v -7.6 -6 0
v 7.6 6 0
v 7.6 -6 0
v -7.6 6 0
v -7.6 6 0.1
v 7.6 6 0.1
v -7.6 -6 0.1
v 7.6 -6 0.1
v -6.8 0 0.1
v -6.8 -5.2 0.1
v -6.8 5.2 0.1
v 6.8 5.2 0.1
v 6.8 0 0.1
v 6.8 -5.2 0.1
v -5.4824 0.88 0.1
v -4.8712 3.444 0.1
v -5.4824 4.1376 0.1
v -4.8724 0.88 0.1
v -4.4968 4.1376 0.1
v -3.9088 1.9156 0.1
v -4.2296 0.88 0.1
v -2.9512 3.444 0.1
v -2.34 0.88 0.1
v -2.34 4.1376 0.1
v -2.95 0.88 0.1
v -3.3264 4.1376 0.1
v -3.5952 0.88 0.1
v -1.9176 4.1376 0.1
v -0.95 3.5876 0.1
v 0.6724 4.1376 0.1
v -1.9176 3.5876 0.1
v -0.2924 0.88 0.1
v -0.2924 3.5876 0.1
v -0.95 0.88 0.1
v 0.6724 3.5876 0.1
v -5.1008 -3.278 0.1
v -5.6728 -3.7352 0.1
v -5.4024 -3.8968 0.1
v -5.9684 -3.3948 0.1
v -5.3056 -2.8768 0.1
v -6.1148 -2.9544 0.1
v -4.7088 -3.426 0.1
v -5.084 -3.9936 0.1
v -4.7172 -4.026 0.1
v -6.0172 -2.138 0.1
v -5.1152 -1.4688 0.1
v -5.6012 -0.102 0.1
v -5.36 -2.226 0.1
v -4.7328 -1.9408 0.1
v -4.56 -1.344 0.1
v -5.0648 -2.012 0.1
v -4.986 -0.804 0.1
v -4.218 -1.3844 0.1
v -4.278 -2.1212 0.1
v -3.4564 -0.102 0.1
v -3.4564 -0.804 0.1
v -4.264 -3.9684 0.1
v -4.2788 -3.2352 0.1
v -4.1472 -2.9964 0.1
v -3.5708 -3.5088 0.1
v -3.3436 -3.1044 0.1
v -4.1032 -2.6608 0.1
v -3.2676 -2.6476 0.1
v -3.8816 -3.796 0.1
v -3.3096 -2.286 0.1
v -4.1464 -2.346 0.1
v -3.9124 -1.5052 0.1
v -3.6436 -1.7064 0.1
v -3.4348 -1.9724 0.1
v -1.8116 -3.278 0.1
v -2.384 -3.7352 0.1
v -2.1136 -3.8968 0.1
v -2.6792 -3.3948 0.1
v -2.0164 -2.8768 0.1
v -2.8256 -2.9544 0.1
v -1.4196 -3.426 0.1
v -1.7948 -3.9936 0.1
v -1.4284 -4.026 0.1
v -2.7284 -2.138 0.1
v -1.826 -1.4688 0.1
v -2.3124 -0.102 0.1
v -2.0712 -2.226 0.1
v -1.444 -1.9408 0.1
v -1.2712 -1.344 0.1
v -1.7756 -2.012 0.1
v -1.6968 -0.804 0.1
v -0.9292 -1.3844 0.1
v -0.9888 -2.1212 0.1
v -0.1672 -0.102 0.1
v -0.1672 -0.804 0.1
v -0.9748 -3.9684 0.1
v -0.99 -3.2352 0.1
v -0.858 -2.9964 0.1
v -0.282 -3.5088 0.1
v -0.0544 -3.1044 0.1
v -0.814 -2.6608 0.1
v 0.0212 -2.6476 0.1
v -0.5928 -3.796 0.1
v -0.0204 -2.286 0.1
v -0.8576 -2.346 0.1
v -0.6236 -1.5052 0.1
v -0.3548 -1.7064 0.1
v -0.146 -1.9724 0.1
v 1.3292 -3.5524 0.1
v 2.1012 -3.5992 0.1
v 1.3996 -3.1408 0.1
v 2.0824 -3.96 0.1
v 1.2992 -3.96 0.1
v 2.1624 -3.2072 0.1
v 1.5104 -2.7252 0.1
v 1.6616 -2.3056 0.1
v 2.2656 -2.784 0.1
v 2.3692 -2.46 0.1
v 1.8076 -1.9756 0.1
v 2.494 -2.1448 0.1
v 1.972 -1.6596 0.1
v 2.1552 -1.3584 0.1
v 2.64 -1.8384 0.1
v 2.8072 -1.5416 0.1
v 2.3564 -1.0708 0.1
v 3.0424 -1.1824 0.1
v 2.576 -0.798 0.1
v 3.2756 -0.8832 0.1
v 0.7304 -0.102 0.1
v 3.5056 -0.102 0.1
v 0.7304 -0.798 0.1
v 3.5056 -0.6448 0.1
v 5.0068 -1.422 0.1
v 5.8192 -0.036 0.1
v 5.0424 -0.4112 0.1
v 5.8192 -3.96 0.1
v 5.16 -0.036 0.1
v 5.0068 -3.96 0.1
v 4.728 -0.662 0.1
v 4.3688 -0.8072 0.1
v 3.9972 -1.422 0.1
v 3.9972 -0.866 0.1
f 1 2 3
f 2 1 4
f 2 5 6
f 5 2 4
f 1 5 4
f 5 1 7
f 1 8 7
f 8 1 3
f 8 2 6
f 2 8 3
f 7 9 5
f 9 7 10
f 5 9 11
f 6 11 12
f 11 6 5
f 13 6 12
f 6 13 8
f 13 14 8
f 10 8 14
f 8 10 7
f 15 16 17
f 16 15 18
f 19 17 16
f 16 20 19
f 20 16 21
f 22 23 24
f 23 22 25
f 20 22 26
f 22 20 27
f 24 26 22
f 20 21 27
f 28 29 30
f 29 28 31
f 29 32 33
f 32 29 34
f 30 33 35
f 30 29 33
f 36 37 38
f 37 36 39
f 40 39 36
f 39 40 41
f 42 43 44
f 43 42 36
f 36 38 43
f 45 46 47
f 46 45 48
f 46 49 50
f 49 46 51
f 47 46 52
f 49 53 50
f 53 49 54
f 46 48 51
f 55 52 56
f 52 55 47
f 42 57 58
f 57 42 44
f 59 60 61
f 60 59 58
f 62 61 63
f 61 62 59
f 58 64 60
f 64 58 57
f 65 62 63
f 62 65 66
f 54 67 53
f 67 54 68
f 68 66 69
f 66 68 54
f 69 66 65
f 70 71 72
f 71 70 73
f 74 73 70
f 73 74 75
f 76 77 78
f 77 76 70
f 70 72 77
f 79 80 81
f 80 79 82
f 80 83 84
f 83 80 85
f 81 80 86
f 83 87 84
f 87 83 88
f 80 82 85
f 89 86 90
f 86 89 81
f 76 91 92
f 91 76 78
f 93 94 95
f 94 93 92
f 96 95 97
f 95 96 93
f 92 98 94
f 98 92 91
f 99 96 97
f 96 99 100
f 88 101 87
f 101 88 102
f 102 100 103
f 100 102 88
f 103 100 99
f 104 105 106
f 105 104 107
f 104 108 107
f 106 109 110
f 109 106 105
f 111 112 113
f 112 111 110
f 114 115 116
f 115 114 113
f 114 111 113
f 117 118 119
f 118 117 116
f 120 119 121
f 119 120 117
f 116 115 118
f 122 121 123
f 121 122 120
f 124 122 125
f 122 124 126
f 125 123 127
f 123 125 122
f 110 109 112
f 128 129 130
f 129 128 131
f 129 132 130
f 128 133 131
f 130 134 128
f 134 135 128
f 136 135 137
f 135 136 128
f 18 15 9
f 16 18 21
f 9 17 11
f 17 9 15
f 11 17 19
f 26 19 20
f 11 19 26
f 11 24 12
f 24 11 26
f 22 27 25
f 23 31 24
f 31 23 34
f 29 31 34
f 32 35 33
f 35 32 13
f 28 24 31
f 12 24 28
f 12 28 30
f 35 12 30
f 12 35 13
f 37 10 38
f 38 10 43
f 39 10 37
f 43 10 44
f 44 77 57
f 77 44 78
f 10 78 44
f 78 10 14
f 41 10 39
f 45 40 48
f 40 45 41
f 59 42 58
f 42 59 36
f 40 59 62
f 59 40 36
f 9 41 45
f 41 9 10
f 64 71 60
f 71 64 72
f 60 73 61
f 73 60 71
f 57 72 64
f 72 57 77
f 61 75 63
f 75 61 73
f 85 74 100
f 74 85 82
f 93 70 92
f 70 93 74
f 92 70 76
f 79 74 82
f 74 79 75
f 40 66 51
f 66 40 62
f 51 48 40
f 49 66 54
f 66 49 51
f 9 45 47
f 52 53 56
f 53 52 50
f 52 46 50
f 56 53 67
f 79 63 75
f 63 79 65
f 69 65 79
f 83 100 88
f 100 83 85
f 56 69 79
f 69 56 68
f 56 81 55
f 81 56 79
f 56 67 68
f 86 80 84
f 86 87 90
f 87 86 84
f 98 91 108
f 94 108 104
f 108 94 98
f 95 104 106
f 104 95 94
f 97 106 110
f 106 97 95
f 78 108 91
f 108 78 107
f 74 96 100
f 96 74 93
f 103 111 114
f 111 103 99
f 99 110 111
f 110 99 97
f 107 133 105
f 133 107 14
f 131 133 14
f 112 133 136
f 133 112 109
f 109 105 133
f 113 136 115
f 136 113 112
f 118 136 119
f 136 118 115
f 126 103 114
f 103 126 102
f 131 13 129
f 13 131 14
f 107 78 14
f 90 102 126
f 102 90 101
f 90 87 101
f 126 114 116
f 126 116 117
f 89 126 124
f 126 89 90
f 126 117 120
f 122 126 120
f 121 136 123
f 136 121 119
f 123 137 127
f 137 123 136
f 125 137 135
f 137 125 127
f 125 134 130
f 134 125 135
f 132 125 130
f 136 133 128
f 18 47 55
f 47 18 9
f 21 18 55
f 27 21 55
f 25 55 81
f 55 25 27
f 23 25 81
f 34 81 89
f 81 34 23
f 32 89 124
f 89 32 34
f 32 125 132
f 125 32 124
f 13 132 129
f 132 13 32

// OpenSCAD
// file: ../p/box5-12.scad
use <../lib.scad>
function ldraw_lib__box5_12() = [
// 0 Box with 5 Faces without Any Edges
// 0 Name: box5-12.dat
// 0 Author: Chris Dee [cwdee]
// 0 !LDRAW_ORG Primitive UPDATE 2009-02
// 0 !LICENSE Licensed under CC BY 2.0 and CC BY 4.0 : see CAreadme.txt
// 
// 0 BFC CERTIFY CCW
  [0,"BFC","CERTIFY"],
  [0,"BFC","CCW"],
// 
// 0 !HISTORY 2009-09-03 [PTadmin] Official Update 2009-02
// 
// 
// 4 16 1 1 1 1 1 -1 -1 1 -1 -1 1 1
  [4,16,1,1,1,1,1,-1,-1,1,-1,-1,1,1],
// 4 16 -1 0 1 1 0 1 1 1 1 -1 1 1
  [4,16,-1,0,1,1,0,1,1,1,1,-1,1,1],
// 4 16 -1 0 -1 -1 0 1 -1 1 1 -1 1 -1
  [4,16,-1,0,-1,-1,0,1,-1,1,1,-1,1,-1],
// 4 16 1 0 -1 -1 0 -1 -1 1 -1 1 1 -1
  [4,16,1,0,-1,-1,0,-1,-1,1,-1,1,1,-1],
// 4 16 1 0 1 1 0 -1 1 1 -1 1 1 1
  [4,16,1,0,1,1,0,-1,1,1,-1,1,1,1],
// 0
];
makepoly(ldraw_lib__box5_12(), line=0.2);
// main file
use <../lib.scad>
use <../p/box5-12.scad>
function ldraw_lib__4100418d() = [
// 0 Sticker  1.5 x  1.9 with "MT 5571"
// 0 Name: 4100418d.dat
// 0 Author: J.C. Tchang [tchang]
// 0 !LDRAW_ORG Part UPDATE 2013-01
// 0 !LICENSE Licensed under CC BY 2.0 and CC BY 4.0 : see CAreadme.txt
// 
// 0 BFC CERTIFY CCW
  [0,"BFC","CERTIFY"],
  [0,"BFC","CCW"],
// 
// 0 !KEYWORDS Set 5571
// 
// 0 !HISTORY 2013-07-21 [PTadmin] Official Update 2013-01
// 
// 
// 1 16 0 -0.25 0 19 0 0 0 0.25 0 0 0 15 box5-12.dat
  [1,16,0,-0.25,0,19,0,0,0,0.25,0,0,0,15, ldraw_lib__box5_12()],
// 4 0 -19 -0.25 15 -19 -0.25 -15 -17 -0.25 -13 -17 -0.25 0
  [4,0,-19,-0.25,15,-19,-0.25,-15,-17,-0.25,-13,-17,-0.25,0],
// 3 0 -19 -0.25 15 -17 -0.25 0 -17 -0.25 13
  [3,0,-19,-0.25,15,-17,-0.25,0,-17,-0.25,13],
// 4 0 -19 -0.25 15 -17 -0.25 13 17 -0.25 13 19 -0.25 15
  [4,0,-19,-0.25,15,-17,-0.25,13,17,-0.25,13,19,-0.25,15],
// 4 0 19 -0.25 15 17 -0.25 13 17 -0.25 0 19 -0.25 -15
  [4,0,19,-0.25,15,17,-0.25,13,17,-0.25,0,19,-0.25,-15],
// 3 0 17 -0.25 0 17 -0.25 -13 19 -0.25 -15
  [3,0,17,-0.25,0,17,-0.25,-13,19,-0.25,-15],
// 4 0 -19 -0.25 -15 19 -0.25 -15 17 -0.25 -13 -17 -0.25 -13
  [4,0,-19,-0.25,-15,19,-0.25,-15,17,-0.25,-13,-17,-0.25,-13],
// 0 //
// 4 0 -13.706 -0.25 2.2 -12.181 -0.25 2.2 -12.178 -0.25 8.61 -13.706 -0.25 10.344
  [4,0,-13.706,-0.25,2.2,-12.181,-0.25,2.2,-12.178,-0.25,8.61,-13.706,-0.25,10.344],
// 3 0 -11.242 -0.25 10.344 -13.706 -0.25 10.344 -12.178 -0.25 8.61
  [3,0,-11.242,-0.25,10.344,-13.706,-0.25,10.344,-12.178,-0.25,8.61],
// 4 0 -9.772 -0.25 4.789 -11.242 -0.25 10.344 -12.178 -0.25 8.61 -10.574 -0.25 2.2
  [4,0,-9.772,-0.25,4.789,-11.242,-0.25,10.344,-12.178,-0.25,8.61,-10.574,-0.25,2.2],
// 4 0 -7.378 -0.25 8.61 -7.375 -0.25 2.2 -5.85 -0.25 2.2 -5.85 -0.25 10.344
  [4,0,-7.378,-0.25,8.61,-7.375,-0.25,2.2,-5.85,-0.25,2.2,-5.85,-0.25,10.344],
// 4 0 -7.378 -0.25 8.61 -8.316 -0.25 10.344 -9.772 -0.25 4.789 -8.988 -0.25 2.2
  [4,0,-7.378,-0.25,8.61,-8.316,-0.25,10.344,-9.772,-0.25,4.789,-8.988,-0.25,2.2],
// 3 0 -5.85 -0.25 10.344 -8.316 -0.25 10.344 -7.378 -0.25 8.61
  [3,0,-5.85,-0.25,10.344,-8.316,-0.25,10.344,-7.378,-0.25,8.61],
// 3 0 -9.772 -0.25 4.789 -10.574 -0.25 2.2 -8.988 -0.25 2.2
  [3,0,-9.772,-0.25,4.789,-10.574,-0.25,2.2,-8.988,-0.25,2.2],
// 4 0 -2.375 -0.25 8.969 1.681 -0.25 10.344 -4.794 -0.25 10.344 -4.794 -0.25 8.969
  [4,0,-2.375,-0.25,8.969,1.681,-0.25,10.344,-4.794,-0.25,10.344,-4.794,-0.25,8.969],
// 4 0 -2.375 -0.25 8.969 -2.375 -0.25 2.2 -0.731 -0.25 2.2 -0.731 -0.25 8.969
  [4,0,-2.375,-0.25,8.969,-2.375,-0.25,2.2,-0.731,-0.25,2.2,-0.731,-0.25,8.969],
// 3 0 1.681 -0.25 10.344 -0.731 -0.25 8.969 1.681 -0.25 8.969
  [3,0,1.681,-0.25,10.344,-0.731,-0.25,8.969,1.681,-0.25,8.969],
// 3 0 1.681 -0.25 10.344 -2.375 -0.25 8.969 -0.731 -0.25 8.969
  [3,0,1.681,-0.25,10.344,-2.375,-0.25,8.969,-0.731,-0.25,8.969],
// 4 0 -12.752 -0.25 -8.195 -14.921 -0.25 -8.487 -14.182 -0.25 -9.338 -13.506 -0.25 -9.742
  [4,0,-12.752,-0.25,-8.195,-14.921,-0.25,-8.487,-14.182,-0.25,-9.338,-13.506,-0.25,-9.742],
// 4 0 -13.264 -0.25 -7.192 -15.287 -0.25 -7.386 -14.921 -0.25 -8.487 -12.752 -0.25 -8.195
  [4,0,-13.264,-0.25,-7.192,-15.287,-0.25,-7.386,-14.921,-0.25,-8.487,-12.752,-0.25,-8.195],
// 4 0 -12.71 -0.25 -9.984 -11.793 -0.25 -10.065 -11.772 -0.25 -8.565 -12.752 -0.25 -8.195
  [4,0,-12.71,-0.25,-9.984,-11.793,-0.25,-10.065,-11.772,-0.25,-8.565,-12.752,-0.25,-8.195],
// 3 0 -12.752 -0.25 -8.195 -13.506 -0.25 -9.742 -12.71 -0.25 -9.984
  [3,0,-12.752,-0.25,-8.195,-13.506,-0.25,-9.742,-12.71,-0.25,-9.984],
// 4 0 -12.788 -0.25 -3.672 -14.003 -0.25 -0.255 -15.043 -0.25 -5.345 -13.4 -0.25 -5.565
  [4,0,-12.788,-0.25,-3.672,-14.003,-0.25,-0.255,-15.043,-0.25,-5.345,-13.4,-0.25,-5.565],
// 4 0 -12.788 -0.25 -3.672 -12.662 -0.25 -5.03 -11.832 -0.25 -4.852 -11.4 -0.25 -3.36
  [4,0,-12.788,-0.25,-3.672,-12.662,-0.25,-5.03,-11.832,-0.25,-4.852,-11.4,-0.25,-3.36],
// 3 0 -14.003 -0.25 -0.255 -12.788 -0.25 -3.672 -12.465 -0.25 -2.01
  [3,0,-14.003,-0.25,-0.255,-12.788,-0.25,-3.672,-12.465,-0.25,-2.01],
// 4 0 -10.545 -0.25 -3.461 -11.4 -0.25 -3.36 -11.832 -0.25 -4.852 -10.695 -0.25 -5.303
  [4,0,-10.545,-0.25,-3.461,-11.4,-0.25,-3.36,-11.832,-0.25,-4.852,-10.695,-0.25,-5.303],
// 3 0 -12.788 -0.25 -3.672 -13.4 -0.25 -5.565 -12.662 -0.25 -5.03
  [3,0,-12.788,-0.25,-3.672,-13.4,-0.25,-5.565,-12.662,-0.25,-5.03],
// 4 0 -8.641 -0.25 -0.255 -14.003 -0.25 -0.255 -12.465 -0.25 -2.01 -8.641 -0.25 -2.01
  [4,0,-8.641,-0.25,-0.255,-14.003,-0.25,-0.255,-12.465,-0.25,-2.01,-8.641,-0.25,-2.01],
// 4 0 -11.772 -0.25 -8.565 -11.793 -0.25 -10.065 -10.66 -0.25 -9.921 -10.697 -0.25 -8.088
  [4,0,-11.772,-0.25,-8.565,-11.793,-0.25,-10.065,-10.66,-0.25,-9.921,-10.697,-0.25,-8.088],
// 4 0 -10.368 -0.25 -7.491 -10.697 -0.25 -8.088 -8.927 -0.25 -8.772 -8.359 -0.25 -7.761
  [4,0,-10.368,-0.25,-7.491,-10.697,-0.25,-8.088,-8.927,-0.25,-8.772,-8.359,-0.25,-7.761],
// 4 0 -10.258 -0.25 -6.652 -10.368 -0.25 -7.491 -8.359 -0.25 -7.761 -8.169 -0.25 -6.619
  [4,0,-10.258,-0.25,-6.652,-10.368,-0.25,-7.491,-8.359,-0.25,-7.761,-8.169,-0.25,-6.619],
// 4 0 -10.697 -0.25 -8.088 -10.66 -0.25 -9.921 -9.704 -0.25 -9.49 -8.927 -0.25 -8.772
  [4,0,-10.697,-0.25,-8.088,-10.66,-0.25,-9.921,-9.704,-0.25,-9.49,-8.927,-0.25,-8.772],
// 4 0 -10.258 -0.25 -6.652 -8.169 -0.25 -6.619 -8.274 -0.25 -5.715 -10.366 -0.25 -5.865
  [4,0,-10.258,-0.25,-6.652,-8.169,-0.25,-6.619,-8.274,-0.25,-5.715,-10.366,-0.25,-5.865],
// 4 0 -10.695 -0.25 -5.303 -9.109 -0.25 -4.266 -9.781 -0.25 -3.763 -10.545 -0.25 -3.461
  [4,0,-10.695,-0.25,-5.303,-9.109,-0.25,-4.266,-9.781,-0.25,-3.763,-10.545,-0.25,-3.461],
// 4 0 -10.695 -0.25 -5.303 -10.366 -0.25 -5.865 -8.587 -0.25 -4.931 -9.109 -0.25 -4.266
  [4,0,-10.695,-0.25,-5.303,-10.366,-0.25,-5.865,-8.587,-0.25,-4.931,-9.109,-0.25,-4.266],
// 3 0 -8.587 -0.25 -4.931 -10.366 -0.25 -5.865 -8.274 -0.25 -5.715
  [3,0,-8.587,-0.25,-4.931,-10.366,-0.25,-5.865,-8.274,-0.25,-5.715],
// 4 0 -4.529 -0.25 -8.195 -6.698 -0.25 -8.487 -5.96 -0.25 -9.338 -5.284 -0.25 -9.742
  [4,0,-4.529,-0.25,-8.195,-6.698,-0.25,-8.487,-5.96,-0.25,-9.338,-5.284,-0.25,-9.742],
// 4 0 -5.041 -0.25 -7.192 -7.064 -0.25 -7.386 -6.698 -0.25 -8.487 -4.529 -0.25 -8.195
  [4,0,-5.041,-0.25,-7.192,-7.064,-0.25,-7.386,-6.698,-0.25,-8.487,-4.529,-0.25,-8.195],
// 4 0 -4.487 -0.25 -9.984 -3.571 -0.25 -10.065 -3.549 -0.25 -8.565 -4.529 -0.25 -8.195
  [4,0,-4.487,-0.25,-9.984,-3.571,-0.25,-10.065,-3.549,-0.25,-8.565,-4.529,-0.25,-8.195],
// 3 0 -4.529 -0.25 -8.195 -5.284 -0.25 -9.742 -4.487 -0.25 -9.984
  [3,0,-4.529,-0.25,-8.195,-5.284,-0.25,-9.742,-4.487,-0.25,-9.984],
// 4 0 -4.565 -0.25 -3.672 -5.781 -0.25 -0.255 -6.821 -0.25 -5.345 -5.178 -0.25 -5.565
  [4,0,-4.565,-0.25,-3.672,-5.781,-0.25,-0.255,-6.821,-0.25,-5.345,-5.178,-0.25,-5.565],
// 4 0 -4.565 -0.25 -3.672 -4.439 -0.25 -5.03 -3.61 -0.25 -4.852 -3.178 -0.25 -3.36
  [4,0,-4.565,-0.25,-3.672,-4.439,-0.25,-5.03,-3.61,-0.25,-4.852,-3.178,-0.25,-3.36],
// 3 0 -5.781 -0.25 -0.255 -4.565 -0.25 -3.672 -4.242 -0.25 -2.01
  [3,0,-5.781,-0.25,-0.255,-4.565,-0.25,-3.672,-4.242,-0.25,-2.01],
// 4 0 -2.323 -0.25 -3.461 -3.178 -0.25 -3.36 -3.61 -0.25 -4.852 -2.472 -0.25 -5.303
  [4,0,-2.323,-0.25,-3.461,-3.178,-0.25,-3.36,-3.61,-0.25,-4.852,-2.472,-0.25,-5.303],
// 3 0 -4.565 -0.25 -3.672 -5.178 -0.25 -5.565 -4.439 -0.25 -5.03
  [3,0,-4.565,-0.25,-3.672,-5.178,-0.25,-5.565,-4.439,-0.25,-5.03],
// 4 0 -0.418 -0.25 -0.255 -5.781 -0.25 -0.255 -4.242 -0.25 -2.01 -0.418 -0.25 -2.01
  [4,0,-0.418,-0.25,-0.255,-5.781,-0.25,-0.255,-4.242,-0.25,-2.01,-0.418,-0.25,-2.01],
// 4 0 -3.549 -0.25 -8.565 -3.571 -0.25 -10.065 -2.437 -0.25 -9.921 -2.475 -0.25 -8.088
  [4,0,-3.549,-0.25,-8.565,-3.571,-0.25,-10.065,-2.437,-0.25,-9.921,-2.475,-0.25,-8.088],
// 4 0 -2.145 -0.25 -7.491 -2.475 -0.25 -8.088 -0.705 -0.25 -8.772 -0.136 -0.25 -7.761
  [4,0,-2.145,-0.25,-7.491,-2.475,-0.25,-8.088,-0.705,-0.25,-8.772,-0.136,-0.25,-7.761],
// 4 0 -2.035 -0.25 -6.652 -2.145 -0.25 -7.491 -0.136 -0.25 -7.761 0.053 -0.25 -6.619
  [4,0,-2.035,-0.25,-6.652,-2.145,-0.25,-7.491,-0.136,-0.25,-7.761,0.053,-0.25,-6.619],
// 4 0 -2.475 -0.25 -8.088 -2.437 -0.25 -9.921 -1.482 -0.25 -9.49 -0.705 -0.25 -8.772
  [4,0,-2.475,-0.25,-8.088,-2.437,-0.25,-9.921,-1.482,-0.25,-9.49,-0.705,-0.25,-8.772],
// 4 0 -2.035 -0.25 -6.652 0.053 -0.25 -6.619 -0.051 -0.25 -5.715 -2.144 -0.25 -5.865
  [4,0,-2.035,-0.25,-6.652,0.053,-0.25,-6.619,-0.051,-0.25,-5.715,-2.144,-0.25,-5.865],
// 4 0 -2.472 -0.25 -5.303 -0.887 -0.25 -4.266 -1.559 -0.25 -3.763 -2.323 -0.25 -3.461
  [4,0,-2.472,-0.25,-5.303,-0.887,-0.25,-4.266,-1.559,-0.25,-3.763,-2.323,-0.25,-3.461],
// 4 0 -2.472 -0.25 -5.303 -2.144 -0.25 -5.865 -0.365 -0.25 -4.931 -0.887 -0.25 -4.266
  [4,0,-2.472,-0.25,-5.303,-2.144,-0.25,-5.865,-0.365,-0.25,-4.931,-0.887,-0.25,-4.266],
// 3 0 -0.365 -0.25 -4.931 -2.144 -0.25 -5.865 -0.051 -0.25 -5.715
  [3,0,-0.365,-0.25,-4.931,-2.144,-0.25,-5.865,-0.051,-0.25,-5.715],
// 4 0 5.253 -0.25 -8.998 3.499 -0.25 -7.852 3.323 -0.25 -8.881 5.206 -0.25 -9.9
  [4,0,5.253,-0.25,-8.998,3.499,-0.25,-7.852,3.323,-0.25,-8.881,5.206,-0.25,-9.9],
// 3 0 3.323 -0.25 -8.881 3.248 -0.25 -9.9 5.206 -0.25 -9.9
  [3,0,3.323,-0.25,-8.881,3.248,-0.25,-9.9,5.206,-0.25,-9.9],
// 4 0 5.406 -0.25 -8.018 3.776 -0.25 -6.813 3.499 -0.25 -7.852 5.253 -0.25 -8.998
  [4,0,5.406,-0.25,-8.018,3.776,-0.25,-6.813,3.499,-0.25,-7.852,5.253,-0.25,-8.998],
// 4 0 4.154 -0.25 -5.764 3.776 -0.25 -6.813 5.664 -0.25 -6.96 5.923 -0.25 -6.15
  [4,0,4.154,-0.25,-5.764,3.776,-0.25,-6.813,5.664,-0.25,-6.96,5.923,-0.25,-6.15],
// 4 0 6.235 -0.25 -5.362 4.93 -0.25 -4.149 4.519 -0.25 -4.939 5.923 -0.25 -6.15
  [4,0,6.235,-0.25,-5.362,4.93,-0.25,-4.149,4.519,-0.25,-4.939,5.923,-0.25,-6.15],
// 3 0 4.519 -0.25 -4.939 4.154 -0.25 -5.764 5.923 -0.25 -6.15
  [3,0,4.519,-0.25,-4.939,4.154,-0.25,-5.764,5.923,-0.25,-6.15],
// 4 0 5.388 -0.25 -3.396 4.93 -0.25 -4.149 6.6 -0.25 -4.596 7.018 -0.25 -3.854
  [4,0,5.388,-0.25,-3.396,4.93,-0.25,-4.149,6.6,-0.25,-4.596,7.018,-0.25,-3.854],
// 4 0 5.891 -0.25 -2.677 5.388 -0.25 -3.396 7.018 -0.25 -3.854 7.606 -0.25 -2.956
  [4,0,5.891,-0.25,-2.677,5.388,-0.25,-3.396,7.018,-0.25,-3.854,7.606,-0.25,-2.956],
// 3 0 4.93 -0.25 -4.149 6.235 -0.25 -5.362 6.6 -0.25 -4.596
  [3,0,4.93,-0.25,-4.149,6.235,-0.25,-5.362,6.6,-0.25,-4.596],
// 4 0 6.44 -0.25 -1.995 5.891 -0.25 -2.677 7.606 -0.25 -2.956 8.189 -0.25 -2.208
  [4,0,6.44,-0.25,-1.995,5.891,-0.25,-2.677,7.606,-0.25,-2.956,8.189,-0.25,-2.208],
// 4 0 1.826 -0.25 -0.255 1.826 -0.25 -1.995 6.44 -0.25 -1.995 8.764 -0.25 -0.255
  [4,0,1.826,-0.25,-0.255,1.826,-0.25,-1.995,6.44,-0.25,-1.995,8.764,-0.25,-0.255],
// 4 0 8.764 -0.25 -1.612 8.764 -0.25 -0.255 6.44 -0.25 -1.995 8.189 -0.25 -2.208
  [4,0,8.764,-0.25,-1.612,8.764,-0.25,-0.255,6.44,-0.25,-1.995,8.189,-0.25,-2.208],
// 3 0 3.776 -0.25 -6.813 5.406 -0.25 -8.018 5.664 -0.25 -6.96
  [3,0,3.776,-0.25,-6.813,5.406,-0.25,-8.018,5.664,-0.25,-6.96],
// 4 0 12.517 -0.25 -3.555 14.548 -0.25 -9.9 14.548 -0.25 -0.09 12.606 -0.25 -1.028
  [4,0,12.517,-0.25,-3.555,14.548,-0.25,-9.9,14.548,-0.25,-0.09,12.606,-0.25,-1.028],
// 3 0 14.548 -0.25 -0.09 12.9 -0.25 -0.09 12.606 -0.25 -1.028
  [3,0,14.548,-0.25,-0.09,12.9,-0.25,-0.09,12.606,-0.25,-1.028],
// 3 0 12.517 -0.25 -3.555 12.517 -0.25 -9.9 14.548 -0.25 -9.9
  [3,0,12.517,-0.25,-3.555,12.517,-0.25,-9.9,14.548,-0.25,-9.9],
// 3 0 12.606 -0.25 -1.028 11.82 -0.25 -1.655 12.517 -0.25 -3.555
  [3,0,12.606,-0.25,-1.028,11.82,-0.25,-1.655,12.517,-0.25,-3.555],
// 3 0 11.82 -0.25 -1.655 10.922 -0.25 -2.018 12.517 -0.25 -3.555
  [3,0,11.82,-0.25,-1.655,10.922,-0.25,-2.018,12.517,-0.25,-3.555],
// 4 0 12.517 -0.25 -3.555 10.922 -0.25 -2.018 9.993 -0.25 -2.165 9.993 -0.25 -3.555
  [4,0,12.517,-0.25,-3.555,10.922,-0.25,-2.018,9.993,-0.25,-2.165,9.993,-0.25,-3.555],
// 0 //
// 3 15 -12.181 -0.25 2.2 -13.706 -0.25 2.2 -17 -0.25 0
  [3,15,-12.181,-0.25,2.2,-13.706,-0.25,2.2,-17,-0.25,0],
// 3 15 -12.178 -0.25 8.61 -12.181 -0.25 2.2 -10.574 -0.25 2.2
  [3,15,-12.178,-0.25,8.61,-12.181,-0.25,2.2,-10.574,-0.25,2.2],
// 4 15 -17 -0.25 0 -13.706 -0.25 2.2 -13.706 -0.25 10.344 -17 -0.25 13
  [4,15,-17,-0.25,0,-13.706,-0.25,2.2,-13.706,-0.25,10.344,-17,-0.25,13],
// 3 15 -17 -0.25 13 -13.706 -0.25 10.344 -11.242 -0.25 10.344
  [3,15,-17,-0.25,13,-13.706,-0.25,10.344,-11.242,-0.25,10.344],
// 3 15 -8.316 -0.25 10.344 -11.242 -0.25 10.344 -9.772 -0.25 4.789
  [3,15,-8.316,-0.25,10.344,-11.242,-0.25,10.344,-9.772,-0.25,4.789],
// 3 15 -17 -0.25 13 -11.242 -0.25 10.344 -8.316 -0.25 10.344
  [3,15,-17,-0.25,13,-11.242,-0.25,10.344,-8.316,-0.25,10.344],
// 4 15 -17 -0.25 13 -8.316 -0.25 10.344 -5.85 -0.25 10.344 17 -0.25 13
  [4,15,-17,-0.25,13,-8.316,-0.25,10.344,-5.85,-0.25,10.344,17,-0.25,13],
// 3 15 -7.378 -0.25 8.61 -8.988 -0.25 2.2 -7.375 -0.25 2.2
  [3,15,-7.378,-0.25,8.61,-8.988,-0.25,2.2,-7.375,-0.25,2.2],
// 4 15 -4.794 -0.25 8.969 -5.85 -0.25 10.344 -5.85 -0.25 2.2 -2.375 -0.25 2.2
  [4,15,-4.794,-0.25,8.969,-5.85,-0.25,10.344,-5.85,-0.25,2.2,-2.375,-0.25,2.2],
// 3 15 -2.375 -0.25 8.969 -4.794 -0.25 8.969 -2.375 -0.25 2.2
  [3,15,-2.375,-0.25,8.969,-4.794,-0.25,8.969,-2.375,-0.25,2.2],
// 4 15 -0.731 -0.25 2.2 17 -0.25 0 1.681 -0.25 8.969 -0.731 -0.25 8.969
  [4,15,-0.731,-0.25,2.2,17,-0.25,0,1.681,-0.25,8.969,-0.731,-0.25,8.969],
// 3 15 -4.794 -0.25 10.344 -5.85 -0.25 10.344 -4.794 -0.25 8.969
  [3,15,-4.794,-0.25,10.344,-5.85,-0.25,10.344,-4.794,-0.25,8.969],
// 3 15 17 -0.25 13 -5.85 -0.25 10.344 -4.794 -0.25 10.344
  [3,15,17,-0.25,13,-5.85,-0.25,10.344,-4.794,-0.25,10.344],
// 3 15 17 -0.25 13 -4.794 -0.25 10.344 1.681 -0.25 10.344
  [3,15,17,-0.25,13,-4.794,-0.25,10.344,1.681,-0.25,10.344],
// 4 15 17 -0.25 13 1.681 -0.25 10.344 1.681 -0.25 8.969 17 -0.25 0
  [4,15,17,-0.25,13,1.681,-0.25,10.344,1.681,-0.25,8.969,17,-0.25,0],
// 3 15 -14.182 -0.25 -9.338 -17 -0.25 -13 -13.506 -0.25 -9.742
  [3,15,-14.182,-0.25,-9.338,-17,-0.25,-13,-13.506,-0.25,-9.742],
// 3 15 -13.506 -0.25 -9.742 -17 -0.25 -13 -12.71 -0.25 -9.984
  [3,15,-13.506,-0.25,-9.742,-17,-0.25,-13,-12.71,-0.25,-9.984],
// 3 15 -14.921 -0.25 -8.487 -17 -0.25 -13 -14.182 -0.25 -9.338
  [3,15,-14.921,-0.25,-8.487,-17,-0.25,-13,-14.182,-0.25,-9.338],
// 3 15 -12.71 -0.25 -9.984 -17 -0.25 -13 -11.793 -0.25 -10.065
  [3,15,-12.71,-0.25,-9.984,-17,-0.25,-13,-11.793,-0.25,-10.065],
// 4 15 -4.487 -0.25 -9.984 -10.66 -0.25 -9.921 -11.793 -0.25 -10.065 -3.571 -0.25 -10.065
  [4,15,-4.487,-0.25,-9.984,-10.66,-0.25,-9.921,-11.793,-0.25,-10.065,-3.571,-0.25,-10.065],
// 4 15 -3.571 -0.25 -10.065 -11.793 -0.25 -10.065 -17 -0.25 -13 17 -0.25 -13
  [4,15,-3.571,-0.25,-10.065,-11.793,-0.25,-10.065,-17,-0.25,-13,17,-0.25,-13],
// 3 15 -15.287 -0.25 -7.386 -17 -0.25 -13 -14.921 -0.25 -8.487
  [3,15,-15.287,-0.25,-7.386,-17,-0.25,-13,-14.921,-0.25,-8.487],
// 4 15 -15.287 -0.25 -7.386 -13.264 -0.25 -7.192 -13.4 -0.25 -5.565 -15.043 -0.25 -5.345
  [4,15,-15.287,-0.25,-7.386,-13.264,-0.25,-7.192,-13.4,-0.25,-5.565,-15.043,-0.25,-5.345],
// 4 15 -12.752 -0.25 -8.195 -11.772 -0.25 -8.565 -10.697 -0.25 -8.088 -10.368 -0.25 -7.491
  [4,15,-12.752,-0.25,-8.195,-11.772,-0.25,-8.565,-10.697,-0.25,-8.088,-10.368,-0.25,-7.491],
// 4 15 -13.264 -0.25 -7.192 -12.752 -0.25 -8.195 -10.368 -0.25 -7.491 -10.258 -0.25 -6.652
  [4,15,-13.264,-0.25,-7.192,-12.752,-0.25,-8.195,-10.368,-0.25,-7.491,-10.258,-0.25,-6.652],
// 4 15 -17 -0.25 -13 -15.287 -0.25 -7.386 -15.043 -0.25 -5.345 -17 -0.25 0
  [4,15,-17,-0.25,-13,-15.287,-0.25,-7.386,-15.043,-0.25,-5.345,-17,-0.25,0],
// 4 15 -5.96 -0.25 -9.338 -8.927 -0.25 -8.772 -9.704 -0.25 -9.49 -5.284 -0.25 -9.742
  [4,15,-5.96,-0.25,-9.338,-8.927,-0.25,-8.772,-9.704,-0.25,-9.49,-5.284,-0.25,-9.742],
// 4 15 -8.927 -0.25 -8.772 -5.96 -0.25 -9.338 -6.698 -0.25 -8.487 -8.359 -0.25 -7.761
  [4,15,-8.927,-0.25,-8.772,-5.96,-0.25,-9.338,-6.698,-0.25,-8.487,-8.359,-0.25,-7.761],
// 4 15 -5.284 -0.25 -9.742 -9.704 -0.25 -9.49 -10.66 -0.25 -9.921 -4.487 -0.25 -9.984
  [4,15,-5.284,-0.25,-9.742,-9.704,-0.25,-9.49,-10.66,-0.25,-9.921,-4.487,-0.25,-9.984],
// 4 15 -8.359 -0.25 -7.761 -6.698 -0.25 -8.487 -7.064 -0.25 -7.386 -8.169 -0.25 -6.619
  [4,15,-8.359,-0.25,-7.761,-6.698,-0.25,-8.487,-7.064,-0.25,-7.386,-8.169,-0.25,-6.619],
// 4 15 -5.041 -0.25 -7.192 -2.144 -0.25 -5.865 -4.439 -0.25 -5.03 -5.178 -0.25 -5.565
  [4,15,-5.041,-0.25,-7.192,-2.144,-0.25,-5.865,-4.439,-0.25,-5.03,-5.178,-0.25,-5.565],
// 4 15 -2.145 -0.25 -7.491 -5.041 -0.25 -7.192 -4.529 -0.25 -8.195 -2.475 -0.25 -8.088
  [4,15,-2.145,-0.25,-7.491,-5.041,-0.25,-7.192,-4.529,-0.25,-8.195,-2.475,-0.25,-8.088],
// 3 15 -2.475 -0.25 -8.088 -4.529 -0.25 -8.195 -3.549 -0.25 -8.565
  [3,15,-2.475,-0.25,-8.088,-4.529,-0.25,-8.195,-3.549,-0.25,-8.565],
// 4 15 -7.064 -0.25 -7.386 -5.041 -0.25 -7.192 -5.178 -0.25 -5.565 -6.821 -0.25 -5.345
  [4,15,-7.064,-0.25,-7.386,-5.041,-0.25,-7.192,-5.178,-0.25,-5.565,-6.821,-0.25,-5.345],
// 4 15 -13.264 -0.25 -7.192 -10.258 -0.25 -6.652 -10.366 -0.25 -5.865 -12.662 -0.25 -5.03
  [4,15,-13.264,-0.25,-7.192,-10.258,-0.25,-6.652,-10.366,-0.25,-5.865,-12.662,-0.25,-5.03],
// 3 15 -12.662 -0.25 -5.03 -13.4 -0.25 -5.565 -13.264 -0.25 -7.192
  [3,15,-12.662,-0.25,-5.03,-13.4,-0.25,-5.565,-13.264,-0.25,-7.192],
// 4 15 -10.366 -0.25 -5.865 -10.695 -0.25 -5.303 -11.832 -0.25 -4.852 -12.662 -0.25 -5.03
  [4,15,-10.366,-0.25,-5.865,-10.695,-0.25,-5.303,-11.832,-0.25,-4.852,-12.662,-0.25,-5.03],
// 3 15 -17 -0.25 0 -15.043 -0.25 -5.345 -14.003 -0.25 -0.255
  [3,15,-17,-0.25,0,-15.043,-0.25,-5.345,-14.003,-0.25,-0.255],
// 4 15 -10.545 -0.25 -3.461 -8.641 -0.25 -2.01 -12.465 -0.25 -2.01 -11.4 -0.25 -3.36
  [4,15,-10.545,-0.25,-3.461,-8.641,-0.25,-2.01,-12.465,-0.25,-2.01,-11.4,-0.25,-3.36],
// 3 15 -12.465 -0.25 -2.01 -12.788 -0.25 -3.672 -11.4 -0.25 -3.36
  [3,15,-12.465,-0.25,-2.01,-12.788,-0.25,-3.672,-11.4,-0.25,-3.36],
// 3 15 -8.641 -0.25 -2.01 -10.545 -0.25 -3.461 -9.781 -0.25 -3.763
  [3,15,-8.641,-0.25,-2.01,-10.545,-0.25,-3.461,-9.781,-0.25,-3.763],
// 4 15 -6.821 -0.25 -5.345 -8.274 -0.25 -5.715 -8.169 -0.25 -6.619 -7.064 -0.25 -7.386
  [4,15,-6.821,-0.25,-5.345,-8.274,-0.25,-5.715,-8.169,-0.25,-6.619,-7.064,-0.25,-7.386],
// 3 15 -8.587 -0.25 -4.931 -8.274 -0.25 -5.715 -6.821 -0.25 -5.345
  [3,15,-8.587,-0.25,-4.931,-8.274,-0.25,-5.715,-6.821,-0.25,-5.345],
// 4 15 -3.61 -0.25 -4.852 -4.439 -0.25 -5.03 -2.144 -0.25 -5.865 -2.472 -0.25 -5.303
  [4,15,-3.61,-0.25,-4.852,-4.439,-0.25,-5.03,-2.144,-0.25,-5.865,-2.472,-0.25,-5.303],
// 4 15 -9.109 -0.25 -4.266 -8.587 -0.25 -4.931 -6.821 -0.25 -5.345 -8.641 -0.25 -2.01
  [4,15,-9.109,-0.25,-4.266,-8.587,-0.25,-4.931,-6.821,-0.25,-5.345,-8.641,-0.25,-2.01],
// 4 15 -5.781 -0.25 -0.255 -8.641 -0.25 -0.255 -8.641 -0.25 -2.01 -6.821 -0.25 -5.345
  [4,15,-5.781,-0.25,-0.255,-8.641,-0.25,-0.255,-8.641,-0.25,-2.01,-6.821,-0.25,-5.345],
// 3 15 -8.641 -0.25 -2.01 -9.781 -0.25 -3.763 -9.109 -0.25 -4.266
  [3,15,-8.641,-0.25,-2.01,-9.781,-0.25,-3.763,-9.109,-0.25,-4.266],
// 3 15 -4.242 -0.25 -2.01 -4.565 -0.25 -3.672 -3.178 -0.25 -3.36
  [3,15,-4.242,-0.25,-2.01,-4.565,-0.25,-3.672,-3.178,-0.25,-3.36],
// 4 15 -4.242 -0.25 -2.01 -3.178 -0.25 -3.36 -2.323 -0.25 -3.461 -0.418 -0.25 -2.01
  [4,15,-4.242,-0.25,-2.01,-3.178,-0.25,-3.36,-2.323,-0.25,-3.461,-0.418,-0.25,-2.01],
// 3 15 -1.482 -0.25 -9.49 -2.437 -0.25 -9.921 3.248 -0.25 -9.9
  [3,15,-1.482,-0.25,-9.49,-2.437,-0.25,-9.921,3.248,-0.25,-9.9],
// 4 15 -0.705 -0.25 -8.772 -1.482 -0.25 -9.49 3.248 -0.25 -9.9 3.323 -0.25 -8.881
  [4,15,-0.705,-0.25,-8.772,-1.482,-0.25,-9.49,3.248,-0.25,-9.9,3.323,-0.25,-8.881],
// 4 15 -0.136 -0.25 -7.761 -0.705 -0.25 -8.772 3.323 -0.25 -8.881 3.499 -0.25 -7.852
  [4,15,-0.136,-0.25,-7.761,-0.705,-0.25,-8.772,3.323,-0.25,-8.881,3.499,-0.25,-7.852],
// 4 15 0.053 -0.25 -6.619 -0.136 -0.25 -7.761 3.499 -0.25 -7.852 3.776 -0.25 -6.813
  [4,15,0.053,-0.25,-6.619,-0.136,-0.25,-7.761,3.499,-0.25,-7.852,3.776,-0.25,-6.813],
// 4 15 3.248 -0.25 -9.9 -2.437 -0.25 -9.921 -3.571 -0.25 -10.065 5.206 -0.25 -9.9
  [4,15,3.248,-0.25,-9.9,-2.437,-0.25,-9.921,-3.571,-0.25,-10.065,5.206,-0.25,-9.9],
// 4 15 -5.041 -0.25 -7.192 -2.145 -0.25 -7.491 -2.035 -0.25 -6.652 -2.144 -0.25 -5.865
  [4,15,-5.041,-0.25,-7.192,-2.145,-0.25,-7.491,-2.035,-0.25,-6.652,-2.144,-0.25,-5.865],
// 4 15 -0.365 -0.25 -4.931 -0.051 -0.25 -5.715 4.154 -0.25 -5.764 4.519 -0.25 -4.939
  [4,15,-0.365,-0.25,-4.931,-0.051,-0.25,-5.715,4.154,-0.25,-5.764,4.519,-0.25,-4.939],
// 4 15 -0.051 -0.25 -5.715 0.053 -0.25 -6.619 3.776 -0.25 -6.813 4.154 -0.25 -5.764
  [4,15,-0.051,-0.25,-5.715,0.053,-0.25,-6.619,3.776,-0.25,-6.813,4.154,-0.25,-5.764],
// 4 15 12.517 -0.25 -9.9 5.253 -0.25 -8.998 5.206 -0.25 -9.9 17 -0.25 -13
  [4,15,12.517,-0.25,-9.9,5.253,-0.25,-8.998,5.206,-0.25,-9.9,17,-0.25,-13],
// 3 15 14.548 -0.25 -9.9 12.517 -0.25 -9.9 17 -0.25 -13
  [3,15,14.548,-0.25,-9.9,12.517,-0.25,-9.9,17,-0.25,-13],
// 4 15 12.517 -0.25 -9.9 9.993 -0.25 -3.555 5.664 -0.25 -6.96 5.406 -0.25 -8.018
  [4,15,12.517,-0.25,-9.9,9.993,-0.25,-3.555,5.664,-0.25,-6.96,5.406,-0.25,-8.018],
// 3 15 5.406 -0.25 -8.018 5.253 -0.25 -8.998 12.517 -0.25 -9.9
  [3,15,5.406,-0.25,-8.018,5.253,-0.25,-8.998,12.517,-0.25,-9.9],
// 4 15 5.923 -0.25 -6.15 5.664 -0.25 -6.96 9.993 -0.25 -3.555 6.235 -0.25 -5.362
  [4,15,5.923,-0.25,-6.15,5.664,-0.25,-6.96,9.993,-0.25,-3.555,6.235,-0.25,-5.362],
// 4 15 6.6 -0.25 -4.596 6.235 -0.25 -5.362 9.993 -0.25 -3.555 7.018 -0.25 -3.854
  [4,15,6.6,-0.25,-4.596,6.235,-0.25,-5.362,9.993,-0.25,-3.555,7.018,-0.25,-3.854],
// 4 15 -0.365 -0.25 -4.931 4.519 -0.25 -4.939 1.826 -0.25 -1.995 -0.887 -0.25 -4.266
  [4,15,-0.365,-0.25,-4.931,4.519,-0.25,-4.939,1.826,-0.25,-1.995,-0.887,-0.25,-4.266],
// 4 15 14.548 -0.25 -0.09 14.548 -0.25 -9.9 17 -0.25 -13 17 -0.25 0
  [4,15,14.548,-0.25,-0.09,14.548,-0.25,-9.9,17,-0.25,-13,17,-0.25,0],
// 3 15 5.206 -0.25 -9.9 -3.571 -0.25 -10.065 17 -0.25 -13
  [3,15,5.206,-0.25,-9.9,-3.571,-0.25,-10.065,17,-0.25,-13],
// 4 15 -0.418 -0.25 -2.01 -1.559 -0.25 -3.763 -0.887 -0.25 -4.266 1.826 -0.25 -1.995
  [4,15,-0.418,-0.25,-2.01,-1.559,-0.25,-3.763,-0.887,-0.25,-4.266,1.826,-0.25,-1.995],
// 3 15 -0.418 -0.25 -2.01 -2.323 -0.25 -3.461 -1.559 -0.25 -3.763
  [3,15,-0.418,-0.25,-2.01,-2.323,-0.25,-3.461,-1.559,-0.25,-3.763],
// 3 15 1.826 -0.25 -1.995 4.519 -0.25 -4.939 4.93 -0.25 -4.149
  [3,15,1.826,-0.25,-1.995,4.519,-0.25,-4.939,4.93,-0.25,-4.149],
// 3 15 1.826 -0.25 -1.995 4.93 -0.25 -4.149 5.388 -0.25 -3.396
  [3,15,1.826,-0.25,-1.995,4.93,-0.25,-4.149,5.388,-0.25,-3.396],
// 4 15 -0.418 -0.25 -0.255 -0.418 -0.25 -2.01 1.826 -0.25 -1.995 1.826 -0.25 -0.255
  [4,15,-0.418,-0.25,-0.255,-0.418,-0.25,-2.01,1.826,-0.25,-1.995,1.826,-0.25,-0.255],
// 3 15 1.826 -0.25 -1.995 5.388 -0.25 -3.396 5.891 -0.25 -2.677
  [3,15,1.826,-0.25,-1.995,5.388,-0.25,-3.396,5.891,-0.25,-2.677],
// 3 15 6.44 -0.25 -1.995 1.826 -0.25 -1.995 5.891 -0.25 -2.677
  [3,15,6.44,-0.25,-1.995,1.826,-0.25,-1.995,5.891,-0.25,-2.677],
// 4 15 7.606 -0.25 -2.956 7.018 -0.25 -3.854 9.993 -0.25 -3.555 8.189 -0.25 -2.208
  [4,15,7.606,-0.25,-2.956,7.018,-0.25,-3.854,9.993,-0.25,-3.555,8.189,-0.25,-2.208],
// 4 15 8.189 -0.25 -2.208 9.993 -0.25 -3.555 9.993 -0.25 -2.165 8.764 -0.25 -1.612
  [4,15,8.189,-0.25,-2.208,9.993,-0.25,-3.555,9.993,-0.25,-2.165,8.764,-0.25,-1.612],
// 4 15 8.764 -0.25 -1.612 9.993 -0.25 -2.165 10.922 -0.25 -2.018 8.764 -0.25 -0.255
  [4,15,8.764,-0.25,-1.612,9.993,-0.25,-2.165,10.922,-0.25,-2.018,8.764,-0.25,-0.255],
// 4 15 8.764 -0.25 -0.255 10.922 -0.25 -2.018 11.82 -0.25 -1.655 12.606 -0.25 -1.028
  [4,15,8.764,-0.25,-0.255,10.922,-0.25,-2.018,11.82,-0.25,-1.655,12.606,-0.25,-1.028],
// 3 15 12.9 -0.25 -0.09 8.764 -0.25 -0.255 12.606 -0.25 -1.028
  [3,15,12.9,-0.25,-0.09,8.764,-0.25,-0.255,12.606,-0.25,-1.028],
// 3 15 9.993 -0.25 -3.555 12.517 -0.25 -9.9 12.517 -0.25 -3.555
  [3,15,9.993,-0.25,-3.555,12.517,-0.25,-9.9,12.517,-0.25,-3.555],
// 4 15 -12.181 -0.25 2.2 -17 -0.25 0 -14.003 -0.25 -0.255 -8.641 -0.25 -0.255
  [4,15,-12.181,-0.25,2.2,-17,-0.25,0,-14.003,-0.25,-0.255,-8.641,-0.25,-0.255],
// 3 15 -10.574 -0.25 2.2 -12.181 -0.25 2.2 -8.641 -0.25 -0.255
  [3,15,-10.574,-0.25,2.2,-12.181,-0.25,2.2,-8.641,-0.25,-0.255],
// 3 15 -8.988 -0.25 2.2 -10.574 -0.25 2.2 -8.641 -0.25 -0.255
  [3,15,-8.988,-0.25,2.2,-10.574,-0.25,2.2,-8.641,-0.25,-0.255],
// 4 15 -7.375 -0.25 2.2 -8.988 -0.25 2.2 -8.641 -0.25 -0.255 -5.781 -0.25 -0.255
  [4,15,-7.375,-0.25,2.2,-8.988,-0.25,2.2,-8.641,-0.25,-0.255,-5.781,-0.25,-0.255],
// 3 15 -5.85 -0.25 2.2 -7.375 -0.25 2.2 -5.781 -0.25 -0.255
  [3,15,-5.85,-0.25,2.2,-7.375,-0.25,2.2,-5.781,-0.25,-0.255],
// 4 15 -2.375 -0.25 2.2 -5.85 -0.25 2.2 -5.781 -0.25 -0.255 -0.418 -0.25 -0.255
  [4,15,-2.375,-0.25,2.2,-5.85,-0.25,2.2,-5.781,-0.25,-0.255,-0.418,-0.25,-0.255],
// 4 15 -0.731 -0.25 2.2 -2.375 -0.25 2.2 -0.418 -0.25 -0.255 1.826 -0.25 -0.255
  [4,15,-0.731,-0.25,2.2,-2.375,-0.25,2.2,-0.418,-0.25,-0.255,1.826,-0.25,-0.255],
// 4 15 -0.731 -0.25 2.2 1.826 -0.25 -0.255 8.764 -0.25 -0.255 12.9 -0.25 -0.09
  [4,15,-0.731,-0.25,2.2,1.826,-0.25,-0.255,8.764,-0.25,-0.255,12.9,-0.25,-0.09],
// 4 15 -0.731 -0.25 2.2 12.9 -0.25 -0.09 14.548 -0.25 -0.09 17 -0.25 0
  [4,15,-0.731,-0.25,2.2,12.9,-0.25,-0.09,14.548,-0.25,-0.09,17,-0.25,0],
];
makepoly(ldraw_lib__4100418d(), line=0.2);
